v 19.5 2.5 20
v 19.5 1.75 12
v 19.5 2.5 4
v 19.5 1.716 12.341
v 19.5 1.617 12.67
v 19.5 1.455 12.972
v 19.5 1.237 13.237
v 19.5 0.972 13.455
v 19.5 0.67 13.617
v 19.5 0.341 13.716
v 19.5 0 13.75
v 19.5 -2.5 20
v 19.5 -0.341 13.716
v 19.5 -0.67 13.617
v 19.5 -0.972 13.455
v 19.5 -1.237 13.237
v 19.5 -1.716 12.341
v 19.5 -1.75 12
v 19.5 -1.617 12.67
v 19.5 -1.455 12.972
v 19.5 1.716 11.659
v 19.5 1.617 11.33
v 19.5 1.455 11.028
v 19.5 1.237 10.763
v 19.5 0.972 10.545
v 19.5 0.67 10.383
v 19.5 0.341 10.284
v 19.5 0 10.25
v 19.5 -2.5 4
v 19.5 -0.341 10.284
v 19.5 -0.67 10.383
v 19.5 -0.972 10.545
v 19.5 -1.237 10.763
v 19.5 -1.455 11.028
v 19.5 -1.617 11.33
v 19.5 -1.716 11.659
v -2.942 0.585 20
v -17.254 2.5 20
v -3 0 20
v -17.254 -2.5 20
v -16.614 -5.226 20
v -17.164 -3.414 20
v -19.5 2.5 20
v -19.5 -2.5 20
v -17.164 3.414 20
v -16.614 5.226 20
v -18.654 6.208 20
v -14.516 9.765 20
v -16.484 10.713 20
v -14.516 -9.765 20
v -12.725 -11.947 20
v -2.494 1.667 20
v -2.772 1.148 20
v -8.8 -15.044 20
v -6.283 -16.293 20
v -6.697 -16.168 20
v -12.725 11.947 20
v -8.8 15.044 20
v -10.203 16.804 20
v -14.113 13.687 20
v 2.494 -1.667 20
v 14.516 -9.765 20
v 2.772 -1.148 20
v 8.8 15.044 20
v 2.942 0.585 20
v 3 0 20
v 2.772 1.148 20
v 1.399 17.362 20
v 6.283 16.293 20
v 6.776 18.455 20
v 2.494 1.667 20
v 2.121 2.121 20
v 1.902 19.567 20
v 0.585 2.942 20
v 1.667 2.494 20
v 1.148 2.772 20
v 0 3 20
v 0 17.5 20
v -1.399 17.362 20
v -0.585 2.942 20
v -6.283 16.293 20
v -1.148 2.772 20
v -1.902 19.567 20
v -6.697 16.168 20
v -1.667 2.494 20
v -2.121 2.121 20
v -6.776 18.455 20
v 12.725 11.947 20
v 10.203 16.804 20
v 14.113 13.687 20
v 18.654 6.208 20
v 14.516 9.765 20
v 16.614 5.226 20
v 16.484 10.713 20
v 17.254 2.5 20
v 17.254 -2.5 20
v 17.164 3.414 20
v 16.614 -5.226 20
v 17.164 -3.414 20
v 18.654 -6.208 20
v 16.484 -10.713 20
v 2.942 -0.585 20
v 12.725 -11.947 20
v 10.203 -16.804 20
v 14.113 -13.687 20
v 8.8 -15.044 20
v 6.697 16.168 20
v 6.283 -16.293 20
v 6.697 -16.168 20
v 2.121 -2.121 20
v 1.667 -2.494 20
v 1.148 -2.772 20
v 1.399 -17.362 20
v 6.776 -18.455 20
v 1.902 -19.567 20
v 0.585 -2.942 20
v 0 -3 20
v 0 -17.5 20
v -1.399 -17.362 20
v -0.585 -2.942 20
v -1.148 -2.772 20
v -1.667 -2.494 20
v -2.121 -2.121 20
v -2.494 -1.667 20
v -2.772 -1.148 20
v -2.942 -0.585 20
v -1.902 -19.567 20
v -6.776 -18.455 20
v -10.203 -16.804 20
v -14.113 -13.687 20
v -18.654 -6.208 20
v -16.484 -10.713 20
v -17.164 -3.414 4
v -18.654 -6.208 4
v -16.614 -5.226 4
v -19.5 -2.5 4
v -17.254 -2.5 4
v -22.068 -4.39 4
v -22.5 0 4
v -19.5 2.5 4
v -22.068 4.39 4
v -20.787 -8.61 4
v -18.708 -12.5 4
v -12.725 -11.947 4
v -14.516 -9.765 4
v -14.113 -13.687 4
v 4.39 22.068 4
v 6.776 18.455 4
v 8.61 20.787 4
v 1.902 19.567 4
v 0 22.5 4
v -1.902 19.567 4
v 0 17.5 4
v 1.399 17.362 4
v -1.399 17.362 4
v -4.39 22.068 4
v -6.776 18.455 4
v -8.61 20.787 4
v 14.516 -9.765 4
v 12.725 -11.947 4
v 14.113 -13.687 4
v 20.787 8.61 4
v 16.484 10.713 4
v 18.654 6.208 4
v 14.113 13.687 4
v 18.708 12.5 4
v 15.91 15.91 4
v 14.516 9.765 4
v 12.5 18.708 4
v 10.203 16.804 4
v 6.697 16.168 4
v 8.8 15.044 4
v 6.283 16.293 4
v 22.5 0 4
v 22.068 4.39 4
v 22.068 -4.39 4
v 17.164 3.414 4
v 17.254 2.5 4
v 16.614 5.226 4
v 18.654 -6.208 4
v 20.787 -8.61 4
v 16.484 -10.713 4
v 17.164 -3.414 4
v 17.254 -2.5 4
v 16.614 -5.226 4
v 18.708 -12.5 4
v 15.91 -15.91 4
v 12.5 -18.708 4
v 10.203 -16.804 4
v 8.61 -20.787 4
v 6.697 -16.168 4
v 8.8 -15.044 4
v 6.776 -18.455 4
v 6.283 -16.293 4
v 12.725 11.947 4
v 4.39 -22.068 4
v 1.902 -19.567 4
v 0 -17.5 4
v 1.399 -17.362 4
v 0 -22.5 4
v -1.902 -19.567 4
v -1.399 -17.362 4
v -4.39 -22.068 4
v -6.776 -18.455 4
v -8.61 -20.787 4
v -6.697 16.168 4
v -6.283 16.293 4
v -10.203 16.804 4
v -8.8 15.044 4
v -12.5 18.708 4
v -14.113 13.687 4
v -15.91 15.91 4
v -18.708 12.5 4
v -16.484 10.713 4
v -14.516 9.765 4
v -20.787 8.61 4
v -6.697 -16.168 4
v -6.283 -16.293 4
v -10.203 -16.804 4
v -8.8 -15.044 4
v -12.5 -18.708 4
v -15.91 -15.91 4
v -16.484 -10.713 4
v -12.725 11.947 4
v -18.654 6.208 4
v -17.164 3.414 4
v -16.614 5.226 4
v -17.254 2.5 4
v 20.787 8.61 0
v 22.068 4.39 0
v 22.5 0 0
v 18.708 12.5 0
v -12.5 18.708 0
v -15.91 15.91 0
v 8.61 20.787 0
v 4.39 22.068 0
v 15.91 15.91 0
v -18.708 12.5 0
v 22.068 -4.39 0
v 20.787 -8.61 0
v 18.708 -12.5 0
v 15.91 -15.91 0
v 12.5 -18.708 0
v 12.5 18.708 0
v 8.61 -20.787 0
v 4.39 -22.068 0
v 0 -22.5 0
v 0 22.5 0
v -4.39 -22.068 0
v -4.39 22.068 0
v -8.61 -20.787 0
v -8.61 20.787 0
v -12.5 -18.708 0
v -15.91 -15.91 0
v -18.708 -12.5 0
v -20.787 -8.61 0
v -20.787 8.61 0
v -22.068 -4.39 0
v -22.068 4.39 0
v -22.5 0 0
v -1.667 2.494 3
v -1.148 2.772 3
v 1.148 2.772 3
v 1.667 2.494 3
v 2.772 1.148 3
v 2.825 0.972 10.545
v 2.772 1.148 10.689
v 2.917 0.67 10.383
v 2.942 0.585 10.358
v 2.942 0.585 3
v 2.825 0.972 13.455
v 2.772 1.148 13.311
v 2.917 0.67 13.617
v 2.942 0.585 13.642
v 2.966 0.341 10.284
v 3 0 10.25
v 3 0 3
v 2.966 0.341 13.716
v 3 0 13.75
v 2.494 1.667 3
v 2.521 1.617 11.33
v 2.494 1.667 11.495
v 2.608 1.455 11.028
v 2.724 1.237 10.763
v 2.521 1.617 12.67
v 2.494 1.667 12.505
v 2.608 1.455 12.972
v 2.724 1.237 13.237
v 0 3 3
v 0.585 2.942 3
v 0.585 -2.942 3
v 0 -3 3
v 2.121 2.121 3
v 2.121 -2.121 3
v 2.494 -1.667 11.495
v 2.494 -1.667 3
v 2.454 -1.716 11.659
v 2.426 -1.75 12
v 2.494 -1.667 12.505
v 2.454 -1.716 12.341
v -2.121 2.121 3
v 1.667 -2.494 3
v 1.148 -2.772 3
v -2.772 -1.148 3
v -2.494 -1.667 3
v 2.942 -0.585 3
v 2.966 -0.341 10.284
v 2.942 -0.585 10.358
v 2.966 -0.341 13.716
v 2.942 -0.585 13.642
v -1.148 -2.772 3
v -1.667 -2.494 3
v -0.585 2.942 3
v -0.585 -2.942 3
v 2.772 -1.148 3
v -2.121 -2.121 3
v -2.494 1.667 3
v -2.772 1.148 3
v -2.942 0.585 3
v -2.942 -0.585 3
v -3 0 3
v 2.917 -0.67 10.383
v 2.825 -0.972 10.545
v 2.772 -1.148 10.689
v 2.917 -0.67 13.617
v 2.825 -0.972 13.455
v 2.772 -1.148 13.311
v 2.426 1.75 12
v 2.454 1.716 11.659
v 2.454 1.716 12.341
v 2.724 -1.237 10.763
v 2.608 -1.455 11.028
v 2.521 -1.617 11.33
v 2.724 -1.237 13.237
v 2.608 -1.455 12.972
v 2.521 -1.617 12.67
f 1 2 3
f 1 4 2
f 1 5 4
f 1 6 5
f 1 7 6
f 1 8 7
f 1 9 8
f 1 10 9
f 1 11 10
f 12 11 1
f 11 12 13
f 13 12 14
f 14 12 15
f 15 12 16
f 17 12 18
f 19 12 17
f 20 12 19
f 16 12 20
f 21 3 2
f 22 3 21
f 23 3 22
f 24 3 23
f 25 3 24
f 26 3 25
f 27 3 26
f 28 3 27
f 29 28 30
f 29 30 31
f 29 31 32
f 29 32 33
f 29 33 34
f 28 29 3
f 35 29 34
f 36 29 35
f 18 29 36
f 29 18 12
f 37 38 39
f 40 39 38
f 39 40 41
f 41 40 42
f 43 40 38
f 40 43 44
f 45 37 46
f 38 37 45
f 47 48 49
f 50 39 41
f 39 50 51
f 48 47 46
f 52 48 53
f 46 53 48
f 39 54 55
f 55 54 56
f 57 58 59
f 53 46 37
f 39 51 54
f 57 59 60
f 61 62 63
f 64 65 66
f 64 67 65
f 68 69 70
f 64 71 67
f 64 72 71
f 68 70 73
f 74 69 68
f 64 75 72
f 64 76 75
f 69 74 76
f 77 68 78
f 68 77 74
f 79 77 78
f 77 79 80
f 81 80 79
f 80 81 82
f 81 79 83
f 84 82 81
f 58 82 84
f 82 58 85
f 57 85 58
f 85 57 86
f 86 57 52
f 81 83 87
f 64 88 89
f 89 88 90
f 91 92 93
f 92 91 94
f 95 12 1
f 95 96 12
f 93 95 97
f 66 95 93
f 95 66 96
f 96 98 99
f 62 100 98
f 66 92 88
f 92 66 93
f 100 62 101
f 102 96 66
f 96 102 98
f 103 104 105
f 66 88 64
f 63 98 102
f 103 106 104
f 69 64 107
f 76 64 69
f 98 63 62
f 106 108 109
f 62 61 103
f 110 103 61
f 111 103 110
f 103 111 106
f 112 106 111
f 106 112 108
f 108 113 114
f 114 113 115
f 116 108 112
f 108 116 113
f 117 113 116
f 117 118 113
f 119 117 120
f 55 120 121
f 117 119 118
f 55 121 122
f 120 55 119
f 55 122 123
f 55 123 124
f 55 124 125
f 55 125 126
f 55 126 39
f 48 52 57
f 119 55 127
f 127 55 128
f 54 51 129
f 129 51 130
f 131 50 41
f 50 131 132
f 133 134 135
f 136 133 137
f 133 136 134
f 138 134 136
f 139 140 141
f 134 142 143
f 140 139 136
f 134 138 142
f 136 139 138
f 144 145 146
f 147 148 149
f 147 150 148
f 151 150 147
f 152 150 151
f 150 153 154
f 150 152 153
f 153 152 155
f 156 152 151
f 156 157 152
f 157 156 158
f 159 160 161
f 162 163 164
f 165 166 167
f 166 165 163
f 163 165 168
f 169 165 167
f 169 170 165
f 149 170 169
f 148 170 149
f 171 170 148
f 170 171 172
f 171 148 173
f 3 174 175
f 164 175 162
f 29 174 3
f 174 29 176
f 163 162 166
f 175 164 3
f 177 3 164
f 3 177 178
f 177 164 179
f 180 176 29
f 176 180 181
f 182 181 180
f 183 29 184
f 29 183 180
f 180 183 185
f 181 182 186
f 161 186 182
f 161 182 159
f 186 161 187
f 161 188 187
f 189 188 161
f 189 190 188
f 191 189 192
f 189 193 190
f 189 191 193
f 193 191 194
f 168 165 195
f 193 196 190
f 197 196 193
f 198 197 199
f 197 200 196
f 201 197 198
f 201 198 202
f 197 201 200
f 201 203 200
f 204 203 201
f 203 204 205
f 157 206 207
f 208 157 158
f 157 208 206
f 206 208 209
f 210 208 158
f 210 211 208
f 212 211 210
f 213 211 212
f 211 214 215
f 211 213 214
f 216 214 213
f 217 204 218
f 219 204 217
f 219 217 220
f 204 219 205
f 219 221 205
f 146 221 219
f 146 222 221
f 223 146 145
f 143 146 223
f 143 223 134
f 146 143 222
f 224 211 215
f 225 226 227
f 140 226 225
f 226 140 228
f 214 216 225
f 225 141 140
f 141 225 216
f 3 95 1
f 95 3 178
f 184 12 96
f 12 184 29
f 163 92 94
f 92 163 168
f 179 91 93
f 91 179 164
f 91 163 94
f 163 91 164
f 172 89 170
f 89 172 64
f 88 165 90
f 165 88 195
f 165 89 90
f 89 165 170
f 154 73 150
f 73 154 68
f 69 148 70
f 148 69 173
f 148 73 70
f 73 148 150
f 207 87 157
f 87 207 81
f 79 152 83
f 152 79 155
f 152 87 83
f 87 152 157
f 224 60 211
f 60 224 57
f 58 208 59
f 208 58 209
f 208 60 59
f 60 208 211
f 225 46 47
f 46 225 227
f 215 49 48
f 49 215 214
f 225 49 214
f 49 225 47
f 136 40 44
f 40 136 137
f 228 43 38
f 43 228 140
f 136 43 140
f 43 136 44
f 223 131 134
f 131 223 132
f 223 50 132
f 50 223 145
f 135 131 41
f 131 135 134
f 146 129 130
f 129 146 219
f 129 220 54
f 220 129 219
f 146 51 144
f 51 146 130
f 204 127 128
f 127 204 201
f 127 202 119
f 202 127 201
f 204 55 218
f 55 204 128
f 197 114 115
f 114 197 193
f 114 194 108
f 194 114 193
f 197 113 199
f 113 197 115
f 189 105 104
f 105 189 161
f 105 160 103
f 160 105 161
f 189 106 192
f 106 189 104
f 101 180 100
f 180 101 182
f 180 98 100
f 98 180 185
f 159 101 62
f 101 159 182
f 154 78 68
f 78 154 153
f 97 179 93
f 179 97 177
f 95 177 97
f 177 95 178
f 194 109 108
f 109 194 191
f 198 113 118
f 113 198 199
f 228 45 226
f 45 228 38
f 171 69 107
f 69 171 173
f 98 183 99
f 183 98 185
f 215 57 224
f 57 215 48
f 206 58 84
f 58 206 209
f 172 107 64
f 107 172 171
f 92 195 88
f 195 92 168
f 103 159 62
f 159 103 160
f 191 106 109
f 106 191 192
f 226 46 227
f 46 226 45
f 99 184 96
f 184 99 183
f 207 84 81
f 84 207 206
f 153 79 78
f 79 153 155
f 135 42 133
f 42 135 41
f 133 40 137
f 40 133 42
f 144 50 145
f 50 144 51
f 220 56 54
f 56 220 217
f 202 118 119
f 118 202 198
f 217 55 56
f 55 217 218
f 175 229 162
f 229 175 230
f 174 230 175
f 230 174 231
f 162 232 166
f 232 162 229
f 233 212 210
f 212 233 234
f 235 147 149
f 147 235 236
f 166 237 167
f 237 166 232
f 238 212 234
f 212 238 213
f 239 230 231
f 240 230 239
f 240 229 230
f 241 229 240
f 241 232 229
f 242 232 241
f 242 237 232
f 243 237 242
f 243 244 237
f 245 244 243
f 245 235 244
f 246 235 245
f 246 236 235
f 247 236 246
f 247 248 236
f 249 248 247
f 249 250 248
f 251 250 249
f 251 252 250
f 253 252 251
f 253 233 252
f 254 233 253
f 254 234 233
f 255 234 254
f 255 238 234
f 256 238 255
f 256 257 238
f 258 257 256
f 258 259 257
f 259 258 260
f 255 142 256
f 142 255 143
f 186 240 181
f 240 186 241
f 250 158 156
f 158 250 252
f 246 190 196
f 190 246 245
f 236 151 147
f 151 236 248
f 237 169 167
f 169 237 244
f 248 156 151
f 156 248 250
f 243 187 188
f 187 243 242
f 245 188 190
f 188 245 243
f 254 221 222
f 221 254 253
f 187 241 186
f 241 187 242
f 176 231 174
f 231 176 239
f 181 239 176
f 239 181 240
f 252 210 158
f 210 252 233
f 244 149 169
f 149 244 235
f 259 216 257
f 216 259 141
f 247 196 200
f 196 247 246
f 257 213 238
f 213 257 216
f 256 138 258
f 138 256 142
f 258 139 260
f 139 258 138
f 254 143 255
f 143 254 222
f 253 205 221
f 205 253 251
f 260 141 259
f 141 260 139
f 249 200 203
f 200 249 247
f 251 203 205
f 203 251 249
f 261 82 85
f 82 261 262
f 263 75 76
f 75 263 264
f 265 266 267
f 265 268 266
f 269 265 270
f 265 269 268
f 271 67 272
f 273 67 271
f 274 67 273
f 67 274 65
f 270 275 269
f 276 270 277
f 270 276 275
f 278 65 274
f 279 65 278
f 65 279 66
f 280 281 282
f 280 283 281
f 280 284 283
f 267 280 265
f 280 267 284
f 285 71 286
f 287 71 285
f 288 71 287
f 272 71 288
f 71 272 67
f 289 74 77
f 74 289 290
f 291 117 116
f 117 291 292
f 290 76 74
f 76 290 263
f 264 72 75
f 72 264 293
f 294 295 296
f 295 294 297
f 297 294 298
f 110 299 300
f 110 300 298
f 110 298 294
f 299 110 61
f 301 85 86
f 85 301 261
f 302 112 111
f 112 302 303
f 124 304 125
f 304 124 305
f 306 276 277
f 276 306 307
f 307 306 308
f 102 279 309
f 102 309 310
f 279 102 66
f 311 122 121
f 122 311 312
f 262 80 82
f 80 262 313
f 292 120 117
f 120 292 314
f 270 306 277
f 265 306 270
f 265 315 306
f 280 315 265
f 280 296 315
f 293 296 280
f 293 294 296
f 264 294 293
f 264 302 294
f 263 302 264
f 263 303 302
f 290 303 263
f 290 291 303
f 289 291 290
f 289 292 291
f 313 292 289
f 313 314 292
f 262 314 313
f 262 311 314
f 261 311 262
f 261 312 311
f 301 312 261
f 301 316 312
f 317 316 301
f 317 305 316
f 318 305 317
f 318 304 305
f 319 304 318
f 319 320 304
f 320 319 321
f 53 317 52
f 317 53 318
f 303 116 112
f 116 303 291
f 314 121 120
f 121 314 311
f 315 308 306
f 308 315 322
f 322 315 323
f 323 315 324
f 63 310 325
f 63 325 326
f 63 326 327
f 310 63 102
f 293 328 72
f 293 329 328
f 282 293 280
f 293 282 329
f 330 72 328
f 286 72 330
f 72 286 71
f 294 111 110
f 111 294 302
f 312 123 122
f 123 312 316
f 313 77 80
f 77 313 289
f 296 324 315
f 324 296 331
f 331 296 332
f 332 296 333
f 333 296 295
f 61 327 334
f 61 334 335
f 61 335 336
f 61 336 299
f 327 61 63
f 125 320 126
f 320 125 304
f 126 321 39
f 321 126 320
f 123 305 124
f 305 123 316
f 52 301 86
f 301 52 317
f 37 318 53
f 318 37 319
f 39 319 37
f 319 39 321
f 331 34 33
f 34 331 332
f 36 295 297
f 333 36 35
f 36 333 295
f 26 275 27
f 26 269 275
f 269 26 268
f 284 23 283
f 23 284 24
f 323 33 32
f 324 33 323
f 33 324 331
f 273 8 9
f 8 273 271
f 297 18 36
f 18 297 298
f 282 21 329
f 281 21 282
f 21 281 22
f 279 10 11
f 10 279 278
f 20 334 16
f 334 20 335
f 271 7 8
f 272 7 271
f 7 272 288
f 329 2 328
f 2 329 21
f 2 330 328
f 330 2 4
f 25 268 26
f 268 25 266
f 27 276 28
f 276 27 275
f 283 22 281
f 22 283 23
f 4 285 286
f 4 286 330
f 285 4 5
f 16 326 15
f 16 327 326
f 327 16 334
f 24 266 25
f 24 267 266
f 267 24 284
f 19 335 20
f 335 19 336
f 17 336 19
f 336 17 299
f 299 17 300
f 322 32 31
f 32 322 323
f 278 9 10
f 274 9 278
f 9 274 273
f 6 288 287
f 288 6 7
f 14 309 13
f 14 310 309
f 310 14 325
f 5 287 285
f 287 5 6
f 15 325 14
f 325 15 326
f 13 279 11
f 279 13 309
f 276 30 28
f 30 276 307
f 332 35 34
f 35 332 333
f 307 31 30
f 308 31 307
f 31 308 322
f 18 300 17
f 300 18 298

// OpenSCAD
$fn = 32;

// ----------------------------------------------------------------------
// Control knob: skirt knob with grip ribs
// ----------------------------------------------------------------------

// --- parameters (mm) ---
skirt_d = 45;             // skirt diameter
skirt_t = 4;              // skirt thickness
rib_w = 5;                // grip rib width
rib_out = 3;              // grip rib radial protrusion
n_ribs = 14;              // number of grip ribs
knob_d = 35;              // knob body diameter
knob_h = 16;              // knob body height
bore_d = 6;               // shaft bore diameter
set_d = 3.5;              // set screw bore diameter

rib_step = 360 / n_ribs;  // rib angular step
total_h = skirt_t + knob_h;  // overall height

difference() {
  union() {
    translate([0, 0, skirt_t]) cylinder(h = knob_h, d = knob_d);
    cylinder(h = skirt_t, d = skirt_d);
    for (i = [0 : n_ribs - 1])
      rotate([0, 0, i * rib_step])
        translate([knob_d / 2 - 1, -rib_w / 2, skirt_t])
          cube([rib_out, rib_w, knob_h]);
  }
  translate([0, 0, skirt_t - 1]) cylinder(h = knob_h + 2, d = bore_d);
  translate([-1, 0, skirt_t + knob_h / 2]) rotate([0, 90, 0])
    cylinder(h = knob_d / 2 + bore_d / 2 + 2, d = set_d);
}
